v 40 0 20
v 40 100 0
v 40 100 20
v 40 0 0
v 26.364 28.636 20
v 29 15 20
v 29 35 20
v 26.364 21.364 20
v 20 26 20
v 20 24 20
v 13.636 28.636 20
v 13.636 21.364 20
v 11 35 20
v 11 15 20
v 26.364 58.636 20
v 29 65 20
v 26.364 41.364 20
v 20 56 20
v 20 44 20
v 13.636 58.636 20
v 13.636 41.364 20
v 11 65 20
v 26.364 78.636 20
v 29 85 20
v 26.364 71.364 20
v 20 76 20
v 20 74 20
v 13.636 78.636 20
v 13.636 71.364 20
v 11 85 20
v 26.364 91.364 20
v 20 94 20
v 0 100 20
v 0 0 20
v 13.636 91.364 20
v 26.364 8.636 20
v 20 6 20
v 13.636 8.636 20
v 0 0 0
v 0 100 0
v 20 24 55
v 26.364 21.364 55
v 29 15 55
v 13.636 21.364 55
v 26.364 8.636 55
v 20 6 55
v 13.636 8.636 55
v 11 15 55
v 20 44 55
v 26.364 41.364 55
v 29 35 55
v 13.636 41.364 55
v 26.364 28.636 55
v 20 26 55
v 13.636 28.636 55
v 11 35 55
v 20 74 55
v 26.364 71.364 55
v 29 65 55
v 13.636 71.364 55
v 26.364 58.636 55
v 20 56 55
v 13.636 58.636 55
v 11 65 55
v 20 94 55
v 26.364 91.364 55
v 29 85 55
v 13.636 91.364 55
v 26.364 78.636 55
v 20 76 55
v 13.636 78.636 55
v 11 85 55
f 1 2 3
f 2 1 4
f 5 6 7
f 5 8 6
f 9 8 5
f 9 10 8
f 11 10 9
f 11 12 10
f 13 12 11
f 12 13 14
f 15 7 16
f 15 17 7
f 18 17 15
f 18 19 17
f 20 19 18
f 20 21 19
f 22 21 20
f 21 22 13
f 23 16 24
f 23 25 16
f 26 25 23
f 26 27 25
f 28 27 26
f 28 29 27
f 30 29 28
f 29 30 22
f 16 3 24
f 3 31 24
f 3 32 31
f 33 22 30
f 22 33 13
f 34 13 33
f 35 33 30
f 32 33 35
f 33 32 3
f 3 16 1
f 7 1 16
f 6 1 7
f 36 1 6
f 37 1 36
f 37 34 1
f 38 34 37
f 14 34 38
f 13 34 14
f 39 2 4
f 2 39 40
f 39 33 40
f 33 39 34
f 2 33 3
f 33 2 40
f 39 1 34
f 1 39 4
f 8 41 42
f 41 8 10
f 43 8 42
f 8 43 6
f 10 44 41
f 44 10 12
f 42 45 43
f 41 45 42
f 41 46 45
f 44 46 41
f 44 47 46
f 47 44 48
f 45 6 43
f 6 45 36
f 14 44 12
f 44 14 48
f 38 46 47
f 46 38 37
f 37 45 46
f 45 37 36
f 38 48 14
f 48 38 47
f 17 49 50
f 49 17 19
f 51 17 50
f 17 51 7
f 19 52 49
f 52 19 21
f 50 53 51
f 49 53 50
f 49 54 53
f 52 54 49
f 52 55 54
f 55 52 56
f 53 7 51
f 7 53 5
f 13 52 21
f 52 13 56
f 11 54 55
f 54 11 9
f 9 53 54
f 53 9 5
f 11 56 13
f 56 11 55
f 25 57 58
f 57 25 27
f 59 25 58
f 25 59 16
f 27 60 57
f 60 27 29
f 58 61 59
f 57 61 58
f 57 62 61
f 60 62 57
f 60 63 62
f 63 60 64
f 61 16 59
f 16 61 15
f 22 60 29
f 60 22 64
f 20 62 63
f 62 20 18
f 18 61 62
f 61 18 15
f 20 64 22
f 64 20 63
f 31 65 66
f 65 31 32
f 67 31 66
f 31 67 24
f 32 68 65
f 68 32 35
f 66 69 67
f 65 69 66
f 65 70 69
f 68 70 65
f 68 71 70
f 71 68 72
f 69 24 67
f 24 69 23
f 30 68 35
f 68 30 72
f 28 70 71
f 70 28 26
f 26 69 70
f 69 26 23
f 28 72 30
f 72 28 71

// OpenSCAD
depth = 100;
width = 40;
height = 20;
wall = 2;

module base() {
  color("#4f7270") cube([ width, depth, height ]);
}

module tube() {
  color("#d6a731") cylinder(h = 55, d = 18, $fn = 8);
}

base();
translate([ 20, 15 ]) tube();
translate([ 20, 35 ]) tube();

translate([ 20, 65 ]) tube();
translate([ 20, 85 ]) tube();
